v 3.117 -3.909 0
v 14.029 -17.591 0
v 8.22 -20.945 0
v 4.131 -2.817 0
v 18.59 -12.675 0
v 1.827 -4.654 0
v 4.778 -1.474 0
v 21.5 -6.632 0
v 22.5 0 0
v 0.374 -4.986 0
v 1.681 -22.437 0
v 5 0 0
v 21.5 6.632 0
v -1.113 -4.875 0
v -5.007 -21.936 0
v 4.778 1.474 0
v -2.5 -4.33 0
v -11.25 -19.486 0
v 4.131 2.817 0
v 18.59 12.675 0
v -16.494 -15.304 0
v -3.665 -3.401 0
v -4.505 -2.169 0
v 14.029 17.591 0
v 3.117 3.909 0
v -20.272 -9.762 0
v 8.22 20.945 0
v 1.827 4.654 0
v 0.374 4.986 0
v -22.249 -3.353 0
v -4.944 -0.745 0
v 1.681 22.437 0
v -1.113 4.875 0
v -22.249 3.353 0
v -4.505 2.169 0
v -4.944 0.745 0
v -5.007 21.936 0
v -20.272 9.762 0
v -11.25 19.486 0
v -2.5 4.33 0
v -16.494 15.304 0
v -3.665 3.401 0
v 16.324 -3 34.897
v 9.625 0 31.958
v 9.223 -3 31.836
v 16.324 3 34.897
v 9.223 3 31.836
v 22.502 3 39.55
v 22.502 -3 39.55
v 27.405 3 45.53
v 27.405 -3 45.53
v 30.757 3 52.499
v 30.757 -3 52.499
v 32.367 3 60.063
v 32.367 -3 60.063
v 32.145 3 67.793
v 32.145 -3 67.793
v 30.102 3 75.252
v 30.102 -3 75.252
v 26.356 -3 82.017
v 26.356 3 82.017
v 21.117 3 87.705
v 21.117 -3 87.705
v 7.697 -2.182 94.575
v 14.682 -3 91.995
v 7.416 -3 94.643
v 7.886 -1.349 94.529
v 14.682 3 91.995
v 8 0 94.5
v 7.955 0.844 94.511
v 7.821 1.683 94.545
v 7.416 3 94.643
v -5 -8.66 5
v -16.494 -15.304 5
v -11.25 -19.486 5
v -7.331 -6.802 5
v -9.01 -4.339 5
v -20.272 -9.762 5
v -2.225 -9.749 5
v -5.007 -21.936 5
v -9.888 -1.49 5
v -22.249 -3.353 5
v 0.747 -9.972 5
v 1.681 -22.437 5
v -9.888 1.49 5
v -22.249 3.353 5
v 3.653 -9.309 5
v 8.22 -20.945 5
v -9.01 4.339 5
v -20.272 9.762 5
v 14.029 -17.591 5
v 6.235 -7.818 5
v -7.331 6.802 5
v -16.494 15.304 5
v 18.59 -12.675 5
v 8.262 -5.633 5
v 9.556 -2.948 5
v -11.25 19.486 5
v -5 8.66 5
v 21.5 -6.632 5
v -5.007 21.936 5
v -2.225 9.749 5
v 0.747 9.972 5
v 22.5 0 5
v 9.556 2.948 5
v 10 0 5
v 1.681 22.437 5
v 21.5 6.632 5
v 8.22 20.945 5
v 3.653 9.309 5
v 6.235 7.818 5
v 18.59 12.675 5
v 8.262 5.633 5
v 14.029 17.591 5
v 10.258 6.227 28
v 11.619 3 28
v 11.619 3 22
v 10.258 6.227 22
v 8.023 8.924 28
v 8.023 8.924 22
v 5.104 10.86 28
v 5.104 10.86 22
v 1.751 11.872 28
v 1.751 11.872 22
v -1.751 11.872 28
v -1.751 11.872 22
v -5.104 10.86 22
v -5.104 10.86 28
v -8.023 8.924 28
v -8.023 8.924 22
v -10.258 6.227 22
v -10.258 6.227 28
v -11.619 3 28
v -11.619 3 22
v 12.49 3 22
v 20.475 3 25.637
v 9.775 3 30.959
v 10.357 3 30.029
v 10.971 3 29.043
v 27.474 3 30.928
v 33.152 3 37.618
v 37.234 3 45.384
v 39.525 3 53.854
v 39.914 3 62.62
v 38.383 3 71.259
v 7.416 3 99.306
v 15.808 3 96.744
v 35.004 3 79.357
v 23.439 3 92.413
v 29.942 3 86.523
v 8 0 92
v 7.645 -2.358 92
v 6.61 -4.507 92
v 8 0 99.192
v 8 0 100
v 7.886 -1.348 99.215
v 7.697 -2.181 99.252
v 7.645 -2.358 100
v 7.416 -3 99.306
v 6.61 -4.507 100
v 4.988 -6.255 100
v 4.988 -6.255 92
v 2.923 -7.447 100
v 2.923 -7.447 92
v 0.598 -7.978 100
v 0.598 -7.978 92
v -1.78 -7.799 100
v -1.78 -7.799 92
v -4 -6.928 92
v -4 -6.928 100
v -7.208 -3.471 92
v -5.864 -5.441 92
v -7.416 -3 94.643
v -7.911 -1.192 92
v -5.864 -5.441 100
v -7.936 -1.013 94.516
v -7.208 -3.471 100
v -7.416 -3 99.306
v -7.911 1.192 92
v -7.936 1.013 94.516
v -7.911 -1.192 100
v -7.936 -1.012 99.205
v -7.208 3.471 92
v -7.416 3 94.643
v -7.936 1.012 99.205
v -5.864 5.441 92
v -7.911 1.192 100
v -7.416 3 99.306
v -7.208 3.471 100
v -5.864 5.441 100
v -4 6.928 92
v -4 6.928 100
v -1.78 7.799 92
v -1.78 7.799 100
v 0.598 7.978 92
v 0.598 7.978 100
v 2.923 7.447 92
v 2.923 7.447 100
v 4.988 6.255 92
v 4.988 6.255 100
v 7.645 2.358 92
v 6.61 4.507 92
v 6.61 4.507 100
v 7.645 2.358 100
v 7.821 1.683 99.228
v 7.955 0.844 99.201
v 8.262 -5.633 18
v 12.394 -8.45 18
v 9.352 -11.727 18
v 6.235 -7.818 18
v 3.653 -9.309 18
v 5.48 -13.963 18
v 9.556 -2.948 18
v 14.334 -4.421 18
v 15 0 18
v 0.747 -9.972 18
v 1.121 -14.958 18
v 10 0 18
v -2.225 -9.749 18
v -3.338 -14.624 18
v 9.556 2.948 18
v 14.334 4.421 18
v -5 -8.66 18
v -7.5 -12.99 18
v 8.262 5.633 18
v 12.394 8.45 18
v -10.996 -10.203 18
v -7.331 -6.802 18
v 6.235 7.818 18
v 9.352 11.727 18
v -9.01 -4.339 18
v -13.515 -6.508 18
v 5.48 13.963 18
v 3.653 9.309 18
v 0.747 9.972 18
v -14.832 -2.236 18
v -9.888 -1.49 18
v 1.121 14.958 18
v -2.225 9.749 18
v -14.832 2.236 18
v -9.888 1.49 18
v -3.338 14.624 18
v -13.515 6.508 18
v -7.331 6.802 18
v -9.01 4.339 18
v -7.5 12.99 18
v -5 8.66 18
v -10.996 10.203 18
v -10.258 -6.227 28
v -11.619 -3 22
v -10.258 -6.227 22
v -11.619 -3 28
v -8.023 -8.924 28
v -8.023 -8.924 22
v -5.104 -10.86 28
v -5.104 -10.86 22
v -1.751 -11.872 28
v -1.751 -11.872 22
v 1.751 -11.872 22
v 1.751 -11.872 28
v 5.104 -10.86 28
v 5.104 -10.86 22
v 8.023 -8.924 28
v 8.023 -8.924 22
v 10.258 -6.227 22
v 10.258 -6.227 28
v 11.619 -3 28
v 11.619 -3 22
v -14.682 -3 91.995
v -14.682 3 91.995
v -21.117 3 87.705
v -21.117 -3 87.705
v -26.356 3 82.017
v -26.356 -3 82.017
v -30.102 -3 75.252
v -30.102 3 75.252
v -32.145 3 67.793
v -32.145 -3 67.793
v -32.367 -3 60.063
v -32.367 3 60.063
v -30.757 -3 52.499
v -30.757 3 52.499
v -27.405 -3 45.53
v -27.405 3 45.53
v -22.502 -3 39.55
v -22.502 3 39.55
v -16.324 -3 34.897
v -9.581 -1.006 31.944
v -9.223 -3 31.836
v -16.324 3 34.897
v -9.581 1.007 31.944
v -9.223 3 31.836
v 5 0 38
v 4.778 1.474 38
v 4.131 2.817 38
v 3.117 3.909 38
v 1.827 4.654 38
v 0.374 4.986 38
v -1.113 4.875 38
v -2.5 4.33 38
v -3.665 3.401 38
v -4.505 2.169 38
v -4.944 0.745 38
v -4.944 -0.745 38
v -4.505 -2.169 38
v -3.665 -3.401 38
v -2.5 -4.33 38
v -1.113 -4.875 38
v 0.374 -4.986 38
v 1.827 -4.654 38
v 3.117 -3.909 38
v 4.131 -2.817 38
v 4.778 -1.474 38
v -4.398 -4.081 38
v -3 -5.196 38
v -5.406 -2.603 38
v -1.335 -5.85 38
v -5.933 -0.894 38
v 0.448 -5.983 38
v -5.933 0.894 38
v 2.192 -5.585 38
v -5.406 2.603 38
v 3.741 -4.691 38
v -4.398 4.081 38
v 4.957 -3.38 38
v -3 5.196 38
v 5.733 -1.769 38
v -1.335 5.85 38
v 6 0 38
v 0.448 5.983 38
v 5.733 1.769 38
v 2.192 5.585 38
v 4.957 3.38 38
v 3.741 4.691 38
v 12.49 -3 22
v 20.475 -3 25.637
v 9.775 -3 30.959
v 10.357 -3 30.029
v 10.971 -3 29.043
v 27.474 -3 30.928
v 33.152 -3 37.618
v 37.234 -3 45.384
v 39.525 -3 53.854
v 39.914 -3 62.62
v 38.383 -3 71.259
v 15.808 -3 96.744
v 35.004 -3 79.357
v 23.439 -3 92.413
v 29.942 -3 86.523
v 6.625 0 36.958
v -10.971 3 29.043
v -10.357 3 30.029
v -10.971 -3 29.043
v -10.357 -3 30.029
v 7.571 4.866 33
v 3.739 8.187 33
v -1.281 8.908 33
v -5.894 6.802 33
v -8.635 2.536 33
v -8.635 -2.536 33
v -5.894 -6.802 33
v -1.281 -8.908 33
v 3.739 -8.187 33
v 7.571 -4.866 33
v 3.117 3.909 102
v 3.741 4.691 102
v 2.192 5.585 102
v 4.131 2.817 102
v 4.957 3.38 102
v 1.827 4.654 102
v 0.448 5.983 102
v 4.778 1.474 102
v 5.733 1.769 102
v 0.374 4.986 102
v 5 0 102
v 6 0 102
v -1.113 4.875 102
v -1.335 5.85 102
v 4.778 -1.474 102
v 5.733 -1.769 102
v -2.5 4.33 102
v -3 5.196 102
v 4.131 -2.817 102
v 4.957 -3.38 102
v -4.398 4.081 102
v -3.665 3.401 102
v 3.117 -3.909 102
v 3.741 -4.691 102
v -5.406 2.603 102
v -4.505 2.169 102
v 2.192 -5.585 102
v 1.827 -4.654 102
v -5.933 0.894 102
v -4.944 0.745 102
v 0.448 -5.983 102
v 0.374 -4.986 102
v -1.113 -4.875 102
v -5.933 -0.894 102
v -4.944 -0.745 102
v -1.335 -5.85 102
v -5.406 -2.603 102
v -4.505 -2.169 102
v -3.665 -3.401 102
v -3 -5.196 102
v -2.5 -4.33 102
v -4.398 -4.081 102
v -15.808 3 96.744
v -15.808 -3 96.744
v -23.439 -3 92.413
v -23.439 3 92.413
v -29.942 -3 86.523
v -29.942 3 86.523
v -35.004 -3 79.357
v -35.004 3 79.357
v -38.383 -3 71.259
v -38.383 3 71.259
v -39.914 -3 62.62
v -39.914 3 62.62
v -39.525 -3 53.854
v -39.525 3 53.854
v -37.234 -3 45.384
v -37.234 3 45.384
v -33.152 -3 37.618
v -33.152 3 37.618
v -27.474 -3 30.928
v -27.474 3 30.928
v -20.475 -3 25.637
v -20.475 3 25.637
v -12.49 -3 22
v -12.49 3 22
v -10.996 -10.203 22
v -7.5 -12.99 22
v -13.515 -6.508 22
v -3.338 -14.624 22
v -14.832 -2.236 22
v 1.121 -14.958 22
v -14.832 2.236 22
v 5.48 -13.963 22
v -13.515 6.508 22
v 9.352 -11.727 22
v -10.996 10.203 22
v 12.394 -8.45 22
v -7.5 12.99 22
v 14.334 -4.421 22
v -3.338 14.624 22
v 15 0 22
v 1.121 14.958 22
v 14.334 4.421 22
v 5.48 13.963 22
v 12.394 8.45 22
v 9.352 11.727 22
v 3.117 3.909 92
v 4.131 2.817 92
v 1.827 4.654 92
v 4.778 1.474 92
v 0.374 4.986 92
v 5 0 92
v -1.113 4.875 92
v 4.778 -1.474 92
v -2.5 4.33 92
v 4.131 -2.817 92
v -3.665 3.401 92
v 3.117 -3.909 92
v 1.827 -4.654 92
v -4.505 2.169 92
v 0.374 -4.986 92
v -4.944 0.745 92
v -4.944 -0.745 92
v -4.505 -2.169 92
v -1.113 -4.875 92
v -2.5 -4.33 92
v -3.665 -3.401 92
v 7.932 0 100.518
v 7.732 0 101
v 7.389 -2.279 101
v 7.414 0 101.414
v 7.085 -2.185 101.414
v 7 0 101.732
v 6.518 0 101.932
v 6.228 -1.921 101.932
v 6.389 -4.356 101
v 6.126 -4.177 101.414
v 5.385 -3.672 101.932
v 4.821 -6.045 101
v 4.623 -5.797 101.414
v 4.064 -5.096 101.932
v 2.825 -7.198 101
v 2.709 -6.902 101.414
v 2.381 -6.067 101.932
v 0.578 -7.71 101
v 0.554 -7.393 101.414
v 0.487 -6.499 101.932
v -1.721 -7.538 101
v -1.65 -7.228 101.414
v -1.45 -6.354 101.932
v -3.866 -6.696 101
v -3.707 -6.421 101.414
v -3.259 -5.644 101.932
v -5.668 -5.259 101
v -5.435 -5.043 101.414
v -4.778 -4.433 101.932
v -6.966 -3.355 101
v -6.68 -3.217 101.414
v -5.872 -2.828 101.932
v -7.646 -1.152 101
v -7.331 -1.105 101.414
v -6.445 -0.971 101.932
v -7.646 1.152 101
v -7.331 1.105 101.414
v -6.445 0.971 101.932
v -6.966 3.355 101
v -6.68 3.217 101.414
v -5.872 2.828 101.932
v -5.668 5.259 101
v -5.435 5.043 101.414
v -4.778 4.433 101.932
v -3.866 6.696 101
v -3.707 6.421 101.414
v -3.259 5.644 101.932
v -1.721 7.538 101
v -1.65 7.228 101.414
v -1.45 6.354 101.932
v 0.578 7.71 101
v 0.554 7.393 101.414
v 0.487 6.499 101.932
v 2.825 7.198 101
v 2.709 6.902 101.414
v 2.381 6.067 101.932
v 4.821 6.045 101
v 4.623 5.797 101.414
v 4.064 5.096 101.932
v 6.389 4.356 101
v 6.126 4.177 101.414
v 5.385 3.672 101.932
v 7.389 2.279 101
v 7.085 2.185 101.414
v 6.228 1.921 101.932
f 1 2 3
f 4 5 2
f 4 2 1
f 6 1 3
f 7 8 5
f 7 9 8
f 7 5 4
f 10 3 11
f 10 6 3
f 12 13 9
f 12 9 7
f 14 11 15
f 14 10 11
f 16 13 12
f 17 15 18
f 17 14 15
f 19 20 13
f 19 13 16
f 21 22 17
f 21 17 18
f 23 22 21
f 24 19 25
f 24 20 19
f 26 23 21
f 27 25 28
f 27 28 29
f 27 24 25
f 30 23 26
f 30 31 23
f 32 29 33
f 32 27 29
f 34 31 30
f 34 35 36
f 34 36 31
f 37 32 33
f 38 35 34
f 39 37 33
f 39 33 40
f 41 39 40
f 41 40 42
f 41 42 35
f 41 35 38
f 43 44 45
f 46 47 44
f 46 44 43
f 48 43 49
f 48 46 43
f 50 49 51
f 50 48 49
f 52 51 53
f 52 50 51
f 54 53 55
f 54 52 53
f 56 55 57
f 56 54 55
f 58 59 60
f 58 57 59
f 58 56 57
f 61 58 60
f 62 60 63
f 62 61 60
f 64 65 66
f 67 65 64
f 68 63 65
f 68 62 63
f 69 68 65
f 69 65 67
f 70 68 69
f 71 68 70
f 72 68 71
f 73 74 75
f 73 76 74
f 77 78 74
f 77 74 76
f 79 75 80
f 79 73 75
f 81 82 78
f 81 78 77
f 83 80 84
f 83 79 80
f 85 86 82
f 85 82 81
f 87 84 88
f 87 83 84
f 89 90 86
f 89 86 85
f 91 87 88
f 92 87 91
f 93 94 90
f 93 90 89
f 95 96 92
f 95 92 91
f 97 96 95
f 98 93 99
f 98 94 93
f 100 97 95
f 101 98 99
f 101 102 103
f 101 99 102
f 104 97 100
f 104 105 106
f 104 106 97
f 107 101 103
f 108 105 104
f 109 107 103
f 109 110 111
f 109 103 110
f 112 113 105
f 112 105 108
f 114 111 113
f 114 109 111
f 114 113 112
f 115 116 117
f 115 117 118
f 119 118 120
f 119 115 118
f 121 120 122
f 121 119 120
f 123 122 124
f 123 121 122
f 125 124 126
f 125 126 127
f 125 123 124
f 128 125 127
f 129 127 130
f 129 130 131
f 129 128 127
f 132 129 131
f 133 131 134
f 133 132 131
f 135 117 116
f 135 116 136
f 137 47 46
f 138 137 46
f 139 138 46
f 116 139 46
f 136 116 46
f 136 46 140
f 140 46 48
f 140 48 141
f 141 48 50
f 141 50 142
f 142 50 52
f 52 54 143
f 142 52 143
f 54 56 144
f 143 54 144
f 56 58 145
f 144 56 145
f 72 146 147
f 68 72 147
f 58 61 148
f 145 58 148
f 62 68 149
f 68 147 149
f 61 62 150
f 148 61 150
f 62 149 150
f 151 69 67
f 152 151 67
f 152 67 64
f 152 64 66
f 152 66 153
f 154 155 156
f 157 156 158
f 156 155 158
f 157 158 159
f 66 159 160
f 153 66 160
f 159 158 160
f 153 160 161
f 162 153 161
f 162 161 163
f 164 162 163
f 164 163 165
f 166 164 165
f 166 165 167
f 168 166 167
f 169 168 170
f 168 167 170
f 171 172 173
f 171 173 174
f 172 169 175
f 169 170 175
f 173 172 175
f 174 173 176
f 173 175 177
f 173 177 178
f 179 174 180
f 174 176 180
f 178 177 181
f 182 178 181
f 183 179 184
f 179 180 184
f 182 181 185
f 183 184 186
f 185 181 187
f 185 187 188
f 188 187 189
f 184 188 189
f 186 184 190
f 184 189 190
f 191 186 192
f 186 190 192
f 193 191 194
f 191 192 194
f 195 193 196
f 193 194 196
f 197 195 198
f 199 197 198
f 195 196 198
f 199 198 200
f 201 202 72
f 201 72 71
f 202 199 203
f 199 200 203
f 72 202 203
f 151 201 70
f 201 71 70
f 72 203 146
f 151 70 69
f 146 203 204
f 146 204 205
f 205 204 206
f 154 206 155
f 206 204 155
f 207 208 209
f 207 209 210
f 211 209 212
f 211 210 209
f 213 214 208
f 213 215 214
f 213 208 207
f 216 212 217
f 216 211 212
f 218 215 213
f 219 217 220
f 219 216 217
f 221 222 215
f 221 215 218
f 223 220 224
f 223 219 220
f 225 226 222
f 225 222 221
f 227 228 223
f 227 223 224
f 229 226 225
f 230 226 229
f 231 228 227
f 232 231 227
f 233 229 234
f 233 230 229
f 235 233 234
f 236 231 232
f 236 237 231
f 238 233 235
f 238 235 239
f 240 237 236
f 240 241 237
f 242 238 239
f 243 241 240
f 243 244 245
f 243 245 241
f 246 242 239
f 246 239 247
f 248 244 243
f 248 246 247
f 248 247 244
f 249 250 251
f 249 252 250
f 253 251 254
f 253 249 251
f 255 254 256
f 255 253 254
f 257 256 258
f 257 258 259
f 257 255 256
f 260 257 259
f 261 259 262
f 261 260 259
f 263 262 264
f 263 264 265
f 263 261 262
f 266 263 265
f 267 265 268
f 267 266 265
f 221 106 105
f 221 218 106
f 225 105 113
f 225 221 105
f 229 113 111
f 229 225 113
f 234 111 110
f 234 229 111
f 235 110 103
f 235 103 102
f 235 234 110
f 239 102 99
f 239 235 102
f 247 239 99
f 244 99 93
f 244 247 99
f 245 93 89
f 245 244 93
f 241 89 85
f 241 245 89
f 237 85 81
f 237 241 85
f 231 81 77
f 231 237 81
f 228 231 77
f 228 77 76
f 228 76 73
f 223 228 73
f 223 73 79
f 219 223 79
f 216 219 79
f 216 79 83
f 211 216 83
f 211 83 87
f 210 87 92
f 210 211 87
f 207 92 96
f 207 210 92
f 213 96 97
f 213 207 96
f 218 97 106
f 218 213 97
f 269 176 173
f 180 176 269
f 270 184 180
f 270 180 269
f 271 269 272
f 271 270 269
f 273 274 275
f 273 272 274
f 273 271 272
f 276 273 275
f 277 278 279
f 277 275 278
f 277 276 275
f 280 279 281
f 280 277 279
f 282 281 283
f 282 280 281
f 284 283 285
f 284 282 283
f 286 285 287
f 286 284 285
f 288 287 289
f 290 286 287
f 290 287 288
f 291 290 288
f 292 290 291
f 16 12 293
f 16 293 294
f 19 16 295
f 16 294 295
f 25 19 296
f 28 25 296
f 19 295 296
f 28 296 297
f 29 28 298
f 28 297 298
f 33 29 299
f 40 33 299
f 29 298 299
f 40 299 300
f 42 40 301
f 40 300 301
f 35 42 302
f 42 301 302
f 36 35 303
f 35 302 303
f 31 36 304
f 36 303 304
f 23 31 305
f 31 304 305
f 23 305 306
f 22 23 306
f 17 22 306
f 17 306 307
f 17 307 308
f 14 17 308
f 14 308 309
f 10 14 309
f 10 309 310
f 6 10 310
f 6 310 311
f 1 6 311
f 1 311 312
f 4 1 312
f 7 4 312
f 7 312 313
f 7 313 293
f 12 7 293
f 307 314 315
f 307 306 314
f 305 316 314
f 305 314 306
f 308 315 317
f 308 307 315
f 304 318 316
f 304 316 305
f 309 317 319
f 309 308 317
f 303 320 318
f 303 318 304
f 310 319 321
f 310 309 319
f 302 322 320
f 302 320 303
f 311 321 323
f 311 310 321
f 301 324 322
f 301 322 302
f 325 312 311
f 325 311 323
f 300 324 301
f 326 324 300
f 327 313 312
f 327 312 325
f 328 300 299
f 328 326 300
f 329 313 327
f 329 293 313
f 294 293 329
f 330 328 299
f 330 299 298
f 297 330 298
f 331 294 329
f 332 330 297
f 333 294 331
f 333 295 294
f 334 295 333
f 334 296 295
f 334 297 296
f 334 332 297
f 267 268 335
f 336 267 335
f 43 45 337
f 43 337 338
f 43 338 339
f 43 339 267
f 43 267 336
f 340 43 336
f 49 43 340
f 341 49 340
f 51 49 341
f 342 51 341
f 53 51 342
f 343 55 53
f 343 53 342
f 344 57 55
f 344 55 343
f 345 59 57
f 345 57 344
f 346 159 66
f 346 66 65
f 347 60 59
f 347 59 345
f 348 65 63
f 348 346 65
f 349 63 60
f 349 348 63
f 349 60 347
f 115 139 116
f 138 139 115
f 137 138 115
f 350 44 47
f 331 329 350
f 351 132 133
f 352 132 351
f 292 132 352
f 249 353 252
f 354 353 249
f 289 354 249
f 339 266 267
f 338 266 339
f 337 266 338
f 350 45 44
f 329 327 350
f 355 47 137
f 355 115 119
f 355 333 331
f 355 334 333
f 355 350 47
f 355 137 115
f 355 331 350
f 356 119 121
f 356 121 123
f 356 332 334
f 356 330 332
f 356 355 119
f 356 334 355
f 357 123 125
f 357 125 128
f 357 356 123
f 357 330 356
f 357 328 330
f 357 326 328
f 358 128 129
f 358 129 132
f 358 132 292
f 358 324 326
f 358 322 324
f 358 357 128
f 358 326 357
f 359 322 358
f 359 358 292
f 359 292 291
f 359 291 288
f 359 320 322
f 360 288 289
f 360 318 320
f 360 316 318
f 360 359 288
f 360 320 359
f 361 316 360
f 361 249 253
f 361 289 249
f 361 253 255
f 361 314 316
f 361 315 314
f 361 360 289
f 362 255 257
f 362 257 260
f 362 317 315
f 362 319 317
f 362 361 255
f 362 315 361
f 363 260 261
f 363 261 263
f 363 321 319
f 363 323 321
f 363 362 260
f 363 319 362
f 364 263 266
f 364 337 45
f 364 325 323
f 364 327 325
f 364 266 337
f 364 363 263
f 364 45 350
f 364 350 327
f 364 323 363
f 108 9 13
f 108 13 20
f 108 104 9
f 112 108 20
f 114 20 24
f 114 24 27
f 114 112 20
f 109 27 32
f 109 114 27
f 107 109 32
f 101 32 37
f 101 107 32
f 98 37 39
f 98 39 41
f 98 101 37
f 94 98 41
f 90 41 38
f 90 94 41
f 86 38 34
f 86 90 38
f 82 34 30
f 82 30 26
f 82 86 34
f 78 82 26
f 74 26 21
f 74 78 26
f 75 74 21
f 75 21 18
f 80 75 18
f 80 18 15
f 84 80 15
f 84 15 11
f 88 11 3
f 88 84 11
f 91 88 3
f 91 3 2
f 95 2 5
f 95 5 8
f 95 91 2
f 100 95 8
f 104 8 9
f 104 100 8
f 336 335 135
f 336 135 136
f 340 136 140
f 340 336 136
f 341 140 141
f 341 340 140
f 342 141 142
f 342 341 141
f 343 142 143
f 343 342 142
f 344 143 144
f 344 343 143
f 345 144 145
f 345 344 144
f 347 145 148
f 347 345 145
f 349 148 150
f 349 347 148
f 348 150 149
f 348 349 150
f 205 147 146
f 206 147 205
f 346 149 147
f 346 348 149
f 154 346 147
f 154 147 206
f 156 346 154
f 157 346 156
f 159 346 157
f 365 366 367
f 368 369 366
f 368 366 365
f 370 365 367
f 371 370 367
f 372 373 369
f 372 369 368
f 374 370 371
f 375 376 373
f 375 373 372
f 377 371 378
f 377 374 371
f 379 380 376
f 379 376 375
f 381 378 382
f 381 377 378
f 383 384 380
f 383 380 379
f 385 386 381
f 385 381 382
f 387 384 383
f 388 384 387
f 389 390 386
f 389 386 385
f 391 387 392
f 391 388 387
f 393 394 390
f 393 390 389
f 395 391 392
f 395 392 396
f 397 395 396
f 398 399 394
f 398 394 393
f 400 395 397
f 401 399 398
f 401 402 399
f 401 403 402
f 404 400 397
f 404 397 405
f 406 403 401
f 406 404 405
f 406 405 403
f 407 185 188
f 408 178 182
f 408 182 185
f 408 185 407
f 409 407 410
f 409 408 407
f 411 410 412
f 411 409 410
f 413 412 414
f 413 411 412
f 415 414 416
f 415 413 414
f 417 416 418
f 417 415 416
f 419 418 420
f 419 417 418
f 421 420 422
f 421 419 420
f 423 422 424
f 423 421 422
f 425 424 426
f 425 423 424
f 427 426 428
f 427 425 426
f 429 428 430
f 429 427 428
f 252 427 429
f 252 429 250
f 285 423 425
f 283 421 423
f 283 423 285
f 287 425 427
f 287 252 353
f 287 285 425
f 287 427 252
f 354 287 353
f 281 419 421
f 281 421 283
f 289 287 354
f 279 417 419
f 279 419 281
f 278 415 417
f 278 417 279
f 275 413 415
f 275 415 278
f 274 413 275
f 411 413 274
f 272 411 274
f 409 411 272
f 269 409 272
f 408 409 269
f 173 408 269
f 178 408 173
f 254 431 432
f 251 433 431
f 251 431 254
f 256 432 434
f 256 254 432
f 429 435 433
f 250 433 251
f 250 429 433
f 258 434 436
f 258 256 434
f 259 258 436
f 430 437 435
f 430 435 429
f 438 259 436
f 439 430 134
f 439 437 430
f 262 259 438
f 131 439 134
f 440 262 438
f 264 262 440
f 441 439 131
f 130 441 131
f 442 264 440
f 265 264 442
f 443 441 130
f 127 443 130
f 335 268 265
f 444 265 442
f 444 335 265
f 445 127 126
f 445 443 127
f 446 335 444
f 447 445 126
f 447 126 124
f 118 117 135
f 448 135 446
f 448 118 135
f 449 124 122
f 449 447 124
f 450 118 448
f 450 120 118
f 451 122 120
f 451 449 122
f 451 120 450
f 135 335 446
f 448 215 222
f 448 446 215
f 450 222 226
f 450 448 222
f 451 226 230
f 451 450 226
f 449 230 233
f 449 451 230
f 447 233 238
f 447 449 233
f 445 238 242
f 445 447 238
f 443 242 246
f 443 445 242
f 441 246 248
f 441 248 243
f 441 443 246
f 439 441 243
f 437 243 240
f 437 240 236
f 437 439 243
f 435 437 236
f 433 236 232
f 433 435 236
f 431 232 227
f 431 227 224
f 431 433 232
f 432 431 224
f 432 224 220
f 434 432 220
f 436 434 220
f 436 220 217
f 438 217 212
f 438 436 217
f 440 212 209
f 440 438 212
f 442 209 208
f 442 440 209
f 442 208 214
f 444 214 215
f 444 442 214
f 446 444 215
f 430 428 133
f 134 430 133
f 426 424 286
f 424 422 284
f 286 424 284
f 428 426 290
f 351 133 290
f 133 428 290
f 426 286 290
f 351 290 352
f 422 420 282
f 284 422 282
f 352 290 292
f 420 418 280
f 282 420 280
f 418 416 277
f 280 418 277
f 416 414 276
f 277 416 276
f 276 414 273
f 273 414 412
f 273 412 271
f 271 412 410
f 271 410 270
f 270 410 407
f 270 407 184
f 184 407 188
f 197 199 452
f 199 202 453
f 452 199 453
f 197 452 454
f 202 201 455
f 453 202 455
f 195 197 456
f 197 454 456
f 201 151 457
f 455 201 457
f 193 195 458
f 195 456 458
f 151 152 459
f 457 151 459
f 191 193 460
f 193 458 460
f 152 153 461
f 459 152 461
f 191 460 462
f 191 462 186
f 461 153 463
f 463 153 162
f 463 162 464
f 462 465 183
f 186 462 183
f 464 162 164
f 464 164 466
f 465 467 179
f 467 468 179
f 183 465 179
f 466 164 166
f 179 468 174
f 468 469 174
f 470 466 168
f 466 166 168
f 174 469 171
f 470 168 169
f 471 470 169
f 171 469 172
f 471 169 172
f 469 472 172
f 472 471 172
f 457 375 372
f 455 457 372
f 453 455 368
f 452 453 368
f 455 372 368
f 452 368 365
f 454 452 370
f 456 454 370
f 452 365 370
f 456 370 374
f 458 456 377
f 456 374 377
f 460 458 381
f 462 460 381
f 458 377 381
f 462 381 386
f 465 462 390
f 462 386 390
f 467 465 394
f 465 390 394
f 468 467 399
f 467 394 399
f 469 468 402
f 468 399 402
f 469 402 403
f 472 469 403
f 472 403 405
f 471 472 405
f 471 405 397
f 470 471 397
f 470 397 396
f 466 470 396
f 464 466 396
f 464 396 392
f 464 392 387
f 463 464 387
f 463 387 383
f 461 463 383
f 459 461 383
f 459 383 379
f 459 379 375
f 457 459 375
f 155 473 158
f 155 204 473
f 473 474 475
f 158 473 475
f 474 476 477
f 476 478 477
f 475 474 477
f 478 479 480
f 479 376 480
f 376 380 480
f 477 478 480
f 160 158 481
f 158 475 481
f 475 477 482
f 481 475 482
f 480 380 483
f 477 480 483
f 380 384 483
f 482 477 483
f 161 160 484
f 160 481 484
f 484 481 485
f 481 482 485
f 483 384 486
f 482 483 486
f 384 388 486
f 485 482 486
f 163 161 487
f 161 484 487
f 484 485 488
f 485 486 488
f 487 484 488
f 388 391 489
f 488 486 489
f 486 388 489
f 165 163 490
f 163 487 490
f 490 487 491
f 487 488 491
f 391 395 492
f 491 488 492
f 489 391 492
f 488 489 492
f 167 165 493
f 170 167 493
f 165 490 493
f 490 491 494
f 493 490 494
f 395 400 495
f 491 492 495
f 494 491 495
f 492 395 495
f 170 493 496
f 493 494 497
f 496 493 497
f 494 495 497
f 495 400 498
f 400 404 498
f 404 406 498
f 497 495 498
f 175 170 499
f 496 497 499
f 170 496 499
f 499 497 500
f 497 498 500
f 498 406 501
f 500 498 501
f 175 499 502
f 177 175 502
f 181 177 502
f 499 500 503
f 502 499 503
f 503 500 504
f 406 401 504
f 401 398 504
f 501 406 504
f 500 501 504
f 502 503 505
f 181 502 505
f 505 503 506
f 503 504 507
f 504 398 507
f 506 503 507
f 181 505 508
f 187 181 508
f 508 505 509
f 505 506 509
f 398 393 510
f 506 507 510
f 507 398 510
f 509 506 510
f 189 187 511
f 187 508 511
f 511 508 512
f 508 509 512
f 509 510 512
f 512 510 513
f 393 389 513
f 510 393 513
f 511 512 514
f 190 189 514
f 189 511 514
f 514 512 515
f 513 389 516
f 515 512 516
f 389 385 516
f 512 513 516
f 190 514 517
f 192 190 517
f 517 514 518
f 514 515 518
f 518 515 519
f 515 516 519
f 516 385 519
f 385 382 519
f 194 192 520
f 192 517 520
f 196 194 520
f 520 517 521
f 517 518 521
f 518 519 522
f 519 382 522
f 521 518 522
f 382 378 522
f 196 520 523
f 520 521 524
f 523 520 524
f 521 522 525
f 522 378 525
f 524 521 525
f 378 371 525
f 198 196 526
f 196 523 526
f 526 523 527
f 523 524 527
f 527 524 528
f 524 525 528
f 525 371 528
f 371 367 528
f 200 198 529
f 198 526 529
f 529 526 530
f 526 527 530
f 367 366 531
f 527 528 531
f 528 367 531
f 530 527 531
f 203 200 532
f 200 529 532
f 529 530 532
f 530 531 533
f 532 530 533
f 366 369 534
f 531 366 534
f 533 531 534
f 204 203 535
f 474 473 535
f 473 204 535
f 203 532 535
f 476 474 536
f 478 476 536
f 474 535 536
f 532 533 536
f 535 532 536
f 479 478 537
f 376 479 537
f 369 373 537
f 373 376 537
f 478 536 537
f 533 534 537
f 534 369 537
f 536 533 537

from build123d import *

# Parameters (mm, degrees)
F2_R     = 40
F2_R_2   = 32.5
F3_DEPTH = 3
F4_W     = 8
F4_H     = 10
F6_R     = 5
F7_DEPTH = 102.001
F8_R     = 2


with BuildPart() as f1:
    # F0 (on Front) → F1 (revolve)
    with BuildSketch(Plane.XZ):
        Polygon((0, 38), (0, 0), (22.5, 0), (22.5, 5), (10, 5), (10, 18), (15, 18), (15, 22), (12, 22), (12, 28), (6, 38), align=None)
    revolve(axis=Axis((0, 0, 28.7462979999), (0, 0, 1)))

    # F2 (on Front) → F3 (join, symmetric)
    with BuildSketch(Plane.XZ):
        with Locations((0, 60)):
            Circle(F2_R)
        with Locations((0, 63)):
            Circle(F2_R_2, mode=Mode.SUBTRACT)
    extrude(amount=F3_DEPTH, both=True)

    # F4 (on Front) → F5 (revolve)
    with BuildSketch(Plane.XZ):
        with Locations((4, 97)):
            Rectangle(F4_W, F4_H)
    revolve(axis=Axis((0, 0, 94.4946174344), (0, 0, -1)))

    # F6 (on face) → F7 (cut, through all)
    with BuildSketch(Plane.XY.offset(102)):
        Circle(F6_R)
    extrude(amount=-F7_DEPTH, mode=Mode.SUBTRACT)

    # F8
    f8_edges = [f1.edges().sort_by_distance(p)[0] for p in [
        (-8, 0, 102),
    ]]
    fillet(f8_edges, radius=F8_R)


solid = f1.part
